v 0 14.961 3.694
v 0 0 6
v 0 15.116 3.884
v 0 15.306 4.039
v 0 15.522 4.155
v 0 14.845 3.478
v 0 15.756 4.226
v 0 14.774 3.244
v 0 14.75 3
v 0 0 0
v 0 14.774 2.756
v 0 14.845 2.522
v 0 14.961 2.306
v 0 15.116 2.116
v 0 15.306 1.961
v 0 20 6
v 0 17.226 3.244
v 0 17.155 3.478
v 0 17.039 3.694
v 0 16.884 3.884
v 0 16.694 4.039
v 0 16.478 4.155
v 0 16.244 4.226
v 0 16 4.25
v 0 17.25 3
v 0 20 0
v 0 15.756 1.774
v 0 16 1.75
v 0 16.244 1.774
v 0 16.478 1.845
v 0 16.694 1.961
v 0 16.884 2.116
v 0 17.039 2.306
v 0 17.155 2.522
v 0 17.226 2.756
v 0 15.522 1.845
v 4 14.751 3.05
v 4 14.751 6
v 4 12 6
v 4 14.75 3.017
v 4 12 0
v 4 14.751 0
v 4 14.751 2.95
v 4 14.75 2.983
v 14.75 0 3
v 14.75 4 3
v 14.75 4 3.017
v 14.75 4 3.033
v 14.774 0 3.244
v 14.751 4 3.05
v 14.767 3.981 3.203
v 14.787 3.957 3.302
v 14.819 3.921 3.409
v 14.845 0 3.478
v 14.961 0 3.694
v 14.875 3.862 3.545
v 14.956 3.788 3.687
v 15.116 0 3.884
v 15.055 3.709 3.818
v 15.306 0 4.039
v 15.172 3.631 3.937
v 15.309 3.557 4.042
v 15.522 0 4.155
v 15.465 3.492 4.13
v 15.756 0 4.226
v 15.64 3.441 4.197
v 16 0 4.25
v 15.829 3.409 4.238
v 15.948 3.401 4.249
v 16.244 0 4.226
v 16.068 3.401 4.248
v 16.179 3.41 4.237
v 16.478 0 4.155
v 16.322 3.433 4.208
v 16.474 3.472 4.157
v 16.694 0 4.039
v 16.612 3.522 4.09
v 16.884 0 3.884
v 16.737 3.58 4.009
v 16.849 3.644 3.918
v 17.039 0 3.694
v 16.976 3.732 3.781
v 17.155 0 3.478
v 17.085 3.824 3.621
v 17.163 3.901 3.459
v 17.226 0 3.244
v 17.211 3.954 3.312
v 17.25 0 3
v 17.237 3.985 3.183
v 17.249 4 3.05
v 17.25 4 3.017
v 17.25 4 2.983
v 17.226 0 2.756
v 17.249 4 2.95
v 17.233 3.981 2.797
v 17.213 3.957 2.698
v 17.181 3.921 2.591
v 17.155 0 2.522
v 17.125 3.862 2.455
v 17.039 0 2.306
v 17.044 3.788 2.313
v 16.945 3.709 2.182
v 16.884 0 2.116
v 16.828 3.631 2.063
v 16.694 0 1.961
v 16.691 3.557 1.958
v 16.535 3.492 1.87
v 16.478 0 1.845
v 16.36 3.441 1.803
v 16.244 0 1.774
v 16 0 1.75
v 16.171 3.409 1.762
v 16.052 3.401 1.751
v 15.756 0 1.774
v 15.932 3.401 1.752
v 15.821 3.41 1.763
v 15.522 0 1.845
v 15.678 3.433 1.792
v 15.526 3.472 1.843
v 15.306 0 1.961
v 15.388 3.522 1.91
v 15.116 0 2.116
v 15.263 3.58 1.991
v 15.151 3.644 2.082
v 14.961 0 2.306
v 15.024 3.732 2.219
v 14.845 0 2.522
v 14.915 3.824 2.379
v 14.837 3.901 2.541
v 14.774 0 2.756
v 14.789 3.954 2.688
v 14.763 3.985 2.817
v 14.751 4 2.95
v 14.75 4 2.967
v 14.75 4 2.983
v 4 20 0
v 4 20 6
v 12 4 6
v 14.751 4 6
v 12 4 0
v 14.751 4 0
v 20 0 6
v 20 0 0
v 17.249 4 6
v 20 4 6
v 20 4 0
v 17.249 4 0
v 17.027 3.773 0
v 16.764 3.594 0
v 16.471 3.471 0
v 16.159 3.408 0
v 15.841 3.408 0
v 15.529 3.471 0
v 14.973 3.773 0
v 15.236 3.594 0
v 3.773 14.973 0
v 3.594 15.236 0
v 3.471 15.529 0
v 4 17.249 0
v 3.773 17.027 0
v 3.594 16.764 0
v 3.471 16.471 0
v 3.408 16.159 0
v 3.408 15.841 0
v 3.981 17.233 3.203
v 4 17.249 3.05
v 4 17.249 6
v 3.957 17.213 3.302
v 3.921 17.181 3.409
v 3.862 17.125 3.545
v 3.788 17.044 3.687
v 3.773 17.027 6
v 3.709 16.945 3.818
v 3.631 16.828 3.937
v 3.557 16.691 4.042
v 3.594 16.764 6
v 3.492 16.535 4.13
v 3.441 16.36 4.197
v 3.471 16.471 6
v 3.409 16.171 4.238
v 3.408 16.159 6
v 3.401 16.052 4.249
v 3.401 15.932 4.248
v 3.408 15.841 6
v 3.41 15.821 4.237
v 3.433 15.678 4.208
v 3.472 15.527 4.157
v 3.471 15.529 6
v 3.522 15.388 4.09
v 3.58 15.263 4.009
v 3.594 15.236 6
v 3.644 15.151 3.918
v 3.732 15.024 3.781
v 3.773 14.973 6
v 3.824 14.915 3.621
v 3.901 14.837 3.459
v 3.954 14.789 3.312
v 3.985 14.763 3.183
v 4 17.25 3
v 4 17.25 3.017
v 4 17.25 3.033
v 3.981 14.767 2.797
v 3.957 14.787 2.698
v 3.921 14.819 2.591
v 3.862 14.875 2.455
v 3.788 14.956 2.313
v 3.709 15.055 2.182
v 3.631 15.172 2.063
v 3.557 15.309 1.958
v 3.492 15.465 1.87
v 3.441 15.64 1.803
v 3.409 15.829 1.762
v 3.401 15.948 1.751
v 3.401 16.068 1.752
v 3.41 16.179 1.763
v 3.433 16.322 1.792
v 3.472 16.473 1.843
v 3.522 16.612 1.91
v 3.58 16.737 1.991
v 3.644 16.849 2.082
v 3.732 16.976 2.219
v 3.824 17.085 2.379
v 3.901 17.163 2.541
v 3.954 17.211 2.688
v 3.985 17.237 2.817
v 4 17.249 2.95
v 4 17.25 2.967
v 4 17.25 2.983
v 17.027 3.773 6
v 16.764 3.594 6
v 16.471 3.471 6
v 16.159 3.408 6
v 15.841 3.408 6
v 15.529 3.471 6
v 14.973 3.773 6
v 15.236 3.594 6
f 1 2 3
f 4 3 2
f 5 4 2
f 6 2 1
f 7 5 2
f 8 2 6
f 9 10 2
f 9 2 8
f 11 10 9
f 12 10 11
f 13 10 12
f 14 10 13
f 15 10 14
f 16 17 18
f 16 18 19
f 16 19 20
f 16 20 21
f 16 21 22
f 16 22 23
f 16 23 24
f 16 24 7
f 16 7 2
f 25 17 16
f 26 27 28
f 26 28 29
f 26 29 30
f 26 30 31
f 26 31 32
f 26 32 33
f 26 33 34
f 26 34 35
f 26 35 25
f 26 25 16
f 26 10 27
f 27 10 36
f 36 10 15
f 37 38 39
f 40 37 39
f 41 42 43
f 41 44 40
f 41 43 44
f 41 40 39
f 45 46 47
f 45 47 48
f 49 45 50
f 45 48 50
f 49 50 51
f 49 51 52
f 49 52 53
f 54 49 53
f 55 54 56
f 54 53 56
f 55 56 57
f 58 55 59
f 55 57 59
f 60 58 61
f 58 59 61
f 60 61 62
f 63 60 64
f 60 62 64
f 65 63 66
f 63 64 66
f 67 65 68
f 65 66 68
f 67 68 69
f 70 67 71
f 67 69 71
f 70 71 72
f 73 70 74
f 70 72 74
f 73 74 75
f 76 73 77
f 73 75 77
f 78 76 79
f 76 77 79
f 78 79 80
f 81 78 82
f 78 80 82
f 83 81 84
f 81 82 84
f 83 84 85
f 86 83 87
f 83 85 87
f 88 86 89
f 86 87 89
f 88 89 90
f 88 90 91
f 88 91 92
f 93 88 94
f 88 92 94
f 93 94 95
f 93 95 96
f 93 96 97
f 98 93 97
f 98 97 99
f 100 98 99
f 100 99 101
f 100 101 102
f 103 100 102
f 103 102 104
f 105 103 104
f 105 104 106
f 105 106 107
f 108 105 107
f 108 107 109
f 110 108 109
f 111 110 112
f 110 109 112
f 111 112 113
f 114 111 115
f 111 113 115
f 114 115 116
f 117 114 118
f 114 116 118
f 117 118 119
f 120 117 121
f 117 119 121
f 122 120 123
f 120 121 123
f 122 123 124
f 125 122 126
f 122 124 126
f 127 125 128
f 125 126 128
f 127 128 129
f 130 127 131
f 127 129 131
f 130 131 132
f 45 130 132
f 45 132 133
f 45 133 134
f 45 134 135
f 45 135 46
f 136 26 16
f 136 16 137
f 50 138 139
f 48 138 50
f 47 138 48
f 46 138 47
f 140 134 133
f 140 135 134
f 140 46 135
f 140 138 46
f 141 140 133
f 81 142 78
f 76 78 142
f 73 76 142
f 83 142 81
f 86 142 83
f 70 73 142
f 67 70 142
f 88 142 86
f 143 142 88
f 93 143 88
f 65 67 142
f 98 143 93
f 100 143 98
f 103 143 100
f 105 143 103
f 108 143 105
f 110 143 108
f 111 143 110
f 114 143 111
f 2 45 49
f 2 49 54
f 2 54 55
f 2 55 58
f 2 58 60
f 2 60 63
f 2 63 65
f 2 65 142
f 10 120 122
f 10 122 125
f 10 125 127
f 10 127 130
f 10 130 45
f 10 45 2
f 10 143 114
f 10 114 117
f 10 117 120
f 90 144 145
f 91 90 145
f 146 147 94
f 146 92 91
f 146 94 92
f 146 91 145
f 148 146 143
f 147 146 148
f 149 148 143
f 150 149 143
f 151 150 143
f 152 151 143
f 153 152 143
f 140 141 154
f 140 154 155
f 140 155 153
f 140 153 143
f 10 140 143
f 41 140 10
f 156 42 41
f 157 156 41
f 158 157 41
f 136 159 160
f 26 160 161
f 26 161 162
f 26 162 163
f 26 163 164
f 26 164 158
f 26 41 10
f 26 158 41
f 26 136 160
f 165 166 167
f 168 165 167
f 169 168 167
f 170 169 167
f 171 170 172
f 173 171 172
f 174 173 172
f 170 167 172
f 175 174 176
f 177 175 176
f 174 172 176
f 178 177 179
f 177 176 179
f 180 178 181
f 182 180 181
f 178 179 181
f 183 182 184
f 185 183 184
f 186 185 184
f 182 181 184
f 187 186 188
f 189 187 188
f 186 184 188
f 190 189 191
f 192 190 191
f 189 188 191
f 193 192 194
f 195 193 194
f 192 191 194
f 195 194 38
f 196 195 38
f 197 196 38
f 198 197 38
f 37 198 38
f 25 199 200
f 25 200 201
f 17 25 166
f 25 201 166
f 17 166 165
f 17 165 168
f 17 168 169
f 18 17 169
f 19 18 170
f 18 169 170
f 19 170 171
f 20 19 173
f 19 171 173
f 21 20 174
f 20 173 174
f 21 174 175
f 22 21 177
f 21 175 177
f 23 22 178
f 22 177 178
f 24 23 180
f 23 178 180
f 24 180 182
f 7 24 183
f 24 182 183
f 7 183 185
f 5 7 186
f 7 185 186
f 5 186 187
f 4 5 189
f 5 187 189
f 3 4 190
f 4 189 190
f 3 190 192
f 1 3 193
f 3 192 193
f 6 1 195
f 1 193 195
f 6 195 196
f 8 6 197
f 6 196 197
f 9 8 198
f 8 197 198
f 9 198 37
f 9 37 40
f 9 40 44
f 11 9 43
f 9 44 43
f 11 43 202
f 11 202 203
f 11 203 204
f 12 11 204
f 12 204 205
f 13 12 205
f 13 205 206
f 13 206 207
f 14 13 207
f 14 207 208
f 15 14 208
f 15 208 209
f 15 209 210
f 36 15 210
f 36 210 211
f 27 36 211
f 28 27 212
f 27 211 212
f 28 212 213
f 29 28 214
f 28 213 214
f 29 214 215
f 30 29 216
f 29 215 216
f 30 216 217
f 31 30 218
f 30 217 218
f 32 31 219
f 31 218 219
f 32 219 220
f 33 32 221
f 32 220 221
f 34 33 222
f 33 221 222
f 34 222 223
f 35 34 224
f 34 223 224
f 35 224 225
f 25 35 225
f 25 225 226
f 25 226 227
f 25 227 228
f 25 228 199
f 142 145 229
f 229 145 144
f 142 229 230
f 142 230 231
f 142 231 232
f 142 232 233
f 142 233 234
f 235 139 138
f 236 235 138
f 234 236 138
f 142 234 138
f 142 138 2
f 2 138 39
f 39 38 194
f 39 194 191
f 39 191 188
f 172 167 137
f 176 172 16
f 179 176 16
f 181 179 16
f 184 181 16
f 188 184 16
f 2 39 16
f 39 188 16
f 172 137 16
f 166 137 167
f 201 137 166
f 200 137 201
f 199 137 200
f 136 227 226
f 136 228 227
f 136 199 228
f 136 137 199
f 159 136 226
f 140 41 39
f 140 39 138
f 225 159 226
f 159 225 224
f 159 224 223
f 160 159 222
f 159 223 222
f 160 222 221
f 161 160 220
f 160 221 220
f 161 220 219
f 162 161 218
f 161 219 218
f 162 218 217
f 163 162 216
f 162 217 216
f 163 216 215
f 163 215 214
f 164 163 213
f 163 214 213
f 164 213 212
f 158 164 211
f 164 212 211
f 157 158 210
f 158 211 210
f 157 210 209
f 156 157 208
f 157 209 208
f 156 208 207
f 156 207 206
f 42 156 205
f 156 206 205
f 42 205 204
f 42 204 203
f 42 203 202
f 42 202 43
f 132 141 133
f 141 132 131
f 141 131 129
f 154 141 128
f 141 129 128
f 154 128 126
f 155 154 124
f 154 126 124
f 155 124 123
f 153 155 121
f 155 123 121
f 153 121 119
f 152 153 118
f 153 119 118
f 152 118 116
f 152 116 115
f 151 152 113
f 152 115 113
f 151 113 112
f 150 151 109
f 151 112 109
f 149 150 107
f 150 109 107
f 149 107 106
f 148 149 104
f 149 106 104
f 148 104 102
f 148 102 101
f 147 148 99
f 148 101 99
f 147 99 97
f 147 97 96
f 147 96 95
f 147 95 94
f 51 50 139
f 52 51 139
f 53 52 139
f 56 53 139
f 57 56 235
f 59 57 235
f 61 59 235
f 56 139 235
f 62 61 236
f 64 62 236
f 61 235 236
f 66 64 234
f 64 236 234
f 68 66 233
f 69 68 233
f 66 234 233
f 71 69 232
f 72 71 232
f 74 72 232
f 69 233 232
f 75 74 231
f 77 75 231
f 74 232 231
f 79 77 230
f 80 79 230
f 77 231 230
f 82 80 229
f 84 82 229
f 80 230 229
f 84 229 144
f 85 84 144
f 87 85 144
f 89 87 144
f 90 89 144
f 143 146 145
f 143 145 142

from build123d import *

# Parameters (mm, degrees)
SALIENTE_EXTRUIR1_DEPTH = 6
CROQUIS3_R              = 1.25
CORTAR_EXTRUIR1_DEPTH   = 4
CROQUIS4_R              = 1.25
CORTAR_EXTRUIR2_DEPTH   = 4
CROQUIS5_R              = 1.6
CORTAR_EXTRUIR3_DEPTH   = 6


with BuildPart() as part:
    # Croquis1 → Saliente-Extruir1 (new body)
    with BuildSketch(Plane.XY):
        Polygon((0, 0), (0, 20), (4, 20), (4, 12), (12, 4), (20, 4), (20, 0), align=None)
    extrude(amount=SALIENTE_EXTRUIR1_DEPTH)

    # Croquis3 → Cortar-Extruir1 (cut)
    with BuildSketch(Plane(origin=(0, 4, 0), x_dir=(1, 0, 0), z_dir=(0, 1, 0))):
        with Locations(Location((16, -3, 0), (0, 0, 180))):
            Circle(CROQUIS3_R)
    extrude(amount=-CORTAR_EXTRUIR1_DEPTH, mode=Mode.SUBTRACT)

    # Croquis4 → Cortar-Extruir2 (cut)
    with BuildSketch(Plane(origin=(4, 0, 0), x_dir=(0, 0, -1), z_dir=(1, 0, 0))):
        with Locations(Location((-3, 16, 0), (0, 0, 90))):
            Circle(CROQUIS4_R)
    extrude(amount=-CORTAR_EXTRUIR2_DEPTH, mode=Mode.SUBTRACT)

    # Croquis5 → Cortar-Extruir3 (cut)
    with BuildSketch(Plane.XY.offset(6)):
        with Locations((16, 5)):
            Circle(CROQUIS5_R)
        with Locations((5, 16)):
            Circle(CROQUIS5_R)
    extrude(amount=-CORTAR_EXTRUIR3_DEPTH, mode=Mode.SUBTRACT)


solid = part.part
